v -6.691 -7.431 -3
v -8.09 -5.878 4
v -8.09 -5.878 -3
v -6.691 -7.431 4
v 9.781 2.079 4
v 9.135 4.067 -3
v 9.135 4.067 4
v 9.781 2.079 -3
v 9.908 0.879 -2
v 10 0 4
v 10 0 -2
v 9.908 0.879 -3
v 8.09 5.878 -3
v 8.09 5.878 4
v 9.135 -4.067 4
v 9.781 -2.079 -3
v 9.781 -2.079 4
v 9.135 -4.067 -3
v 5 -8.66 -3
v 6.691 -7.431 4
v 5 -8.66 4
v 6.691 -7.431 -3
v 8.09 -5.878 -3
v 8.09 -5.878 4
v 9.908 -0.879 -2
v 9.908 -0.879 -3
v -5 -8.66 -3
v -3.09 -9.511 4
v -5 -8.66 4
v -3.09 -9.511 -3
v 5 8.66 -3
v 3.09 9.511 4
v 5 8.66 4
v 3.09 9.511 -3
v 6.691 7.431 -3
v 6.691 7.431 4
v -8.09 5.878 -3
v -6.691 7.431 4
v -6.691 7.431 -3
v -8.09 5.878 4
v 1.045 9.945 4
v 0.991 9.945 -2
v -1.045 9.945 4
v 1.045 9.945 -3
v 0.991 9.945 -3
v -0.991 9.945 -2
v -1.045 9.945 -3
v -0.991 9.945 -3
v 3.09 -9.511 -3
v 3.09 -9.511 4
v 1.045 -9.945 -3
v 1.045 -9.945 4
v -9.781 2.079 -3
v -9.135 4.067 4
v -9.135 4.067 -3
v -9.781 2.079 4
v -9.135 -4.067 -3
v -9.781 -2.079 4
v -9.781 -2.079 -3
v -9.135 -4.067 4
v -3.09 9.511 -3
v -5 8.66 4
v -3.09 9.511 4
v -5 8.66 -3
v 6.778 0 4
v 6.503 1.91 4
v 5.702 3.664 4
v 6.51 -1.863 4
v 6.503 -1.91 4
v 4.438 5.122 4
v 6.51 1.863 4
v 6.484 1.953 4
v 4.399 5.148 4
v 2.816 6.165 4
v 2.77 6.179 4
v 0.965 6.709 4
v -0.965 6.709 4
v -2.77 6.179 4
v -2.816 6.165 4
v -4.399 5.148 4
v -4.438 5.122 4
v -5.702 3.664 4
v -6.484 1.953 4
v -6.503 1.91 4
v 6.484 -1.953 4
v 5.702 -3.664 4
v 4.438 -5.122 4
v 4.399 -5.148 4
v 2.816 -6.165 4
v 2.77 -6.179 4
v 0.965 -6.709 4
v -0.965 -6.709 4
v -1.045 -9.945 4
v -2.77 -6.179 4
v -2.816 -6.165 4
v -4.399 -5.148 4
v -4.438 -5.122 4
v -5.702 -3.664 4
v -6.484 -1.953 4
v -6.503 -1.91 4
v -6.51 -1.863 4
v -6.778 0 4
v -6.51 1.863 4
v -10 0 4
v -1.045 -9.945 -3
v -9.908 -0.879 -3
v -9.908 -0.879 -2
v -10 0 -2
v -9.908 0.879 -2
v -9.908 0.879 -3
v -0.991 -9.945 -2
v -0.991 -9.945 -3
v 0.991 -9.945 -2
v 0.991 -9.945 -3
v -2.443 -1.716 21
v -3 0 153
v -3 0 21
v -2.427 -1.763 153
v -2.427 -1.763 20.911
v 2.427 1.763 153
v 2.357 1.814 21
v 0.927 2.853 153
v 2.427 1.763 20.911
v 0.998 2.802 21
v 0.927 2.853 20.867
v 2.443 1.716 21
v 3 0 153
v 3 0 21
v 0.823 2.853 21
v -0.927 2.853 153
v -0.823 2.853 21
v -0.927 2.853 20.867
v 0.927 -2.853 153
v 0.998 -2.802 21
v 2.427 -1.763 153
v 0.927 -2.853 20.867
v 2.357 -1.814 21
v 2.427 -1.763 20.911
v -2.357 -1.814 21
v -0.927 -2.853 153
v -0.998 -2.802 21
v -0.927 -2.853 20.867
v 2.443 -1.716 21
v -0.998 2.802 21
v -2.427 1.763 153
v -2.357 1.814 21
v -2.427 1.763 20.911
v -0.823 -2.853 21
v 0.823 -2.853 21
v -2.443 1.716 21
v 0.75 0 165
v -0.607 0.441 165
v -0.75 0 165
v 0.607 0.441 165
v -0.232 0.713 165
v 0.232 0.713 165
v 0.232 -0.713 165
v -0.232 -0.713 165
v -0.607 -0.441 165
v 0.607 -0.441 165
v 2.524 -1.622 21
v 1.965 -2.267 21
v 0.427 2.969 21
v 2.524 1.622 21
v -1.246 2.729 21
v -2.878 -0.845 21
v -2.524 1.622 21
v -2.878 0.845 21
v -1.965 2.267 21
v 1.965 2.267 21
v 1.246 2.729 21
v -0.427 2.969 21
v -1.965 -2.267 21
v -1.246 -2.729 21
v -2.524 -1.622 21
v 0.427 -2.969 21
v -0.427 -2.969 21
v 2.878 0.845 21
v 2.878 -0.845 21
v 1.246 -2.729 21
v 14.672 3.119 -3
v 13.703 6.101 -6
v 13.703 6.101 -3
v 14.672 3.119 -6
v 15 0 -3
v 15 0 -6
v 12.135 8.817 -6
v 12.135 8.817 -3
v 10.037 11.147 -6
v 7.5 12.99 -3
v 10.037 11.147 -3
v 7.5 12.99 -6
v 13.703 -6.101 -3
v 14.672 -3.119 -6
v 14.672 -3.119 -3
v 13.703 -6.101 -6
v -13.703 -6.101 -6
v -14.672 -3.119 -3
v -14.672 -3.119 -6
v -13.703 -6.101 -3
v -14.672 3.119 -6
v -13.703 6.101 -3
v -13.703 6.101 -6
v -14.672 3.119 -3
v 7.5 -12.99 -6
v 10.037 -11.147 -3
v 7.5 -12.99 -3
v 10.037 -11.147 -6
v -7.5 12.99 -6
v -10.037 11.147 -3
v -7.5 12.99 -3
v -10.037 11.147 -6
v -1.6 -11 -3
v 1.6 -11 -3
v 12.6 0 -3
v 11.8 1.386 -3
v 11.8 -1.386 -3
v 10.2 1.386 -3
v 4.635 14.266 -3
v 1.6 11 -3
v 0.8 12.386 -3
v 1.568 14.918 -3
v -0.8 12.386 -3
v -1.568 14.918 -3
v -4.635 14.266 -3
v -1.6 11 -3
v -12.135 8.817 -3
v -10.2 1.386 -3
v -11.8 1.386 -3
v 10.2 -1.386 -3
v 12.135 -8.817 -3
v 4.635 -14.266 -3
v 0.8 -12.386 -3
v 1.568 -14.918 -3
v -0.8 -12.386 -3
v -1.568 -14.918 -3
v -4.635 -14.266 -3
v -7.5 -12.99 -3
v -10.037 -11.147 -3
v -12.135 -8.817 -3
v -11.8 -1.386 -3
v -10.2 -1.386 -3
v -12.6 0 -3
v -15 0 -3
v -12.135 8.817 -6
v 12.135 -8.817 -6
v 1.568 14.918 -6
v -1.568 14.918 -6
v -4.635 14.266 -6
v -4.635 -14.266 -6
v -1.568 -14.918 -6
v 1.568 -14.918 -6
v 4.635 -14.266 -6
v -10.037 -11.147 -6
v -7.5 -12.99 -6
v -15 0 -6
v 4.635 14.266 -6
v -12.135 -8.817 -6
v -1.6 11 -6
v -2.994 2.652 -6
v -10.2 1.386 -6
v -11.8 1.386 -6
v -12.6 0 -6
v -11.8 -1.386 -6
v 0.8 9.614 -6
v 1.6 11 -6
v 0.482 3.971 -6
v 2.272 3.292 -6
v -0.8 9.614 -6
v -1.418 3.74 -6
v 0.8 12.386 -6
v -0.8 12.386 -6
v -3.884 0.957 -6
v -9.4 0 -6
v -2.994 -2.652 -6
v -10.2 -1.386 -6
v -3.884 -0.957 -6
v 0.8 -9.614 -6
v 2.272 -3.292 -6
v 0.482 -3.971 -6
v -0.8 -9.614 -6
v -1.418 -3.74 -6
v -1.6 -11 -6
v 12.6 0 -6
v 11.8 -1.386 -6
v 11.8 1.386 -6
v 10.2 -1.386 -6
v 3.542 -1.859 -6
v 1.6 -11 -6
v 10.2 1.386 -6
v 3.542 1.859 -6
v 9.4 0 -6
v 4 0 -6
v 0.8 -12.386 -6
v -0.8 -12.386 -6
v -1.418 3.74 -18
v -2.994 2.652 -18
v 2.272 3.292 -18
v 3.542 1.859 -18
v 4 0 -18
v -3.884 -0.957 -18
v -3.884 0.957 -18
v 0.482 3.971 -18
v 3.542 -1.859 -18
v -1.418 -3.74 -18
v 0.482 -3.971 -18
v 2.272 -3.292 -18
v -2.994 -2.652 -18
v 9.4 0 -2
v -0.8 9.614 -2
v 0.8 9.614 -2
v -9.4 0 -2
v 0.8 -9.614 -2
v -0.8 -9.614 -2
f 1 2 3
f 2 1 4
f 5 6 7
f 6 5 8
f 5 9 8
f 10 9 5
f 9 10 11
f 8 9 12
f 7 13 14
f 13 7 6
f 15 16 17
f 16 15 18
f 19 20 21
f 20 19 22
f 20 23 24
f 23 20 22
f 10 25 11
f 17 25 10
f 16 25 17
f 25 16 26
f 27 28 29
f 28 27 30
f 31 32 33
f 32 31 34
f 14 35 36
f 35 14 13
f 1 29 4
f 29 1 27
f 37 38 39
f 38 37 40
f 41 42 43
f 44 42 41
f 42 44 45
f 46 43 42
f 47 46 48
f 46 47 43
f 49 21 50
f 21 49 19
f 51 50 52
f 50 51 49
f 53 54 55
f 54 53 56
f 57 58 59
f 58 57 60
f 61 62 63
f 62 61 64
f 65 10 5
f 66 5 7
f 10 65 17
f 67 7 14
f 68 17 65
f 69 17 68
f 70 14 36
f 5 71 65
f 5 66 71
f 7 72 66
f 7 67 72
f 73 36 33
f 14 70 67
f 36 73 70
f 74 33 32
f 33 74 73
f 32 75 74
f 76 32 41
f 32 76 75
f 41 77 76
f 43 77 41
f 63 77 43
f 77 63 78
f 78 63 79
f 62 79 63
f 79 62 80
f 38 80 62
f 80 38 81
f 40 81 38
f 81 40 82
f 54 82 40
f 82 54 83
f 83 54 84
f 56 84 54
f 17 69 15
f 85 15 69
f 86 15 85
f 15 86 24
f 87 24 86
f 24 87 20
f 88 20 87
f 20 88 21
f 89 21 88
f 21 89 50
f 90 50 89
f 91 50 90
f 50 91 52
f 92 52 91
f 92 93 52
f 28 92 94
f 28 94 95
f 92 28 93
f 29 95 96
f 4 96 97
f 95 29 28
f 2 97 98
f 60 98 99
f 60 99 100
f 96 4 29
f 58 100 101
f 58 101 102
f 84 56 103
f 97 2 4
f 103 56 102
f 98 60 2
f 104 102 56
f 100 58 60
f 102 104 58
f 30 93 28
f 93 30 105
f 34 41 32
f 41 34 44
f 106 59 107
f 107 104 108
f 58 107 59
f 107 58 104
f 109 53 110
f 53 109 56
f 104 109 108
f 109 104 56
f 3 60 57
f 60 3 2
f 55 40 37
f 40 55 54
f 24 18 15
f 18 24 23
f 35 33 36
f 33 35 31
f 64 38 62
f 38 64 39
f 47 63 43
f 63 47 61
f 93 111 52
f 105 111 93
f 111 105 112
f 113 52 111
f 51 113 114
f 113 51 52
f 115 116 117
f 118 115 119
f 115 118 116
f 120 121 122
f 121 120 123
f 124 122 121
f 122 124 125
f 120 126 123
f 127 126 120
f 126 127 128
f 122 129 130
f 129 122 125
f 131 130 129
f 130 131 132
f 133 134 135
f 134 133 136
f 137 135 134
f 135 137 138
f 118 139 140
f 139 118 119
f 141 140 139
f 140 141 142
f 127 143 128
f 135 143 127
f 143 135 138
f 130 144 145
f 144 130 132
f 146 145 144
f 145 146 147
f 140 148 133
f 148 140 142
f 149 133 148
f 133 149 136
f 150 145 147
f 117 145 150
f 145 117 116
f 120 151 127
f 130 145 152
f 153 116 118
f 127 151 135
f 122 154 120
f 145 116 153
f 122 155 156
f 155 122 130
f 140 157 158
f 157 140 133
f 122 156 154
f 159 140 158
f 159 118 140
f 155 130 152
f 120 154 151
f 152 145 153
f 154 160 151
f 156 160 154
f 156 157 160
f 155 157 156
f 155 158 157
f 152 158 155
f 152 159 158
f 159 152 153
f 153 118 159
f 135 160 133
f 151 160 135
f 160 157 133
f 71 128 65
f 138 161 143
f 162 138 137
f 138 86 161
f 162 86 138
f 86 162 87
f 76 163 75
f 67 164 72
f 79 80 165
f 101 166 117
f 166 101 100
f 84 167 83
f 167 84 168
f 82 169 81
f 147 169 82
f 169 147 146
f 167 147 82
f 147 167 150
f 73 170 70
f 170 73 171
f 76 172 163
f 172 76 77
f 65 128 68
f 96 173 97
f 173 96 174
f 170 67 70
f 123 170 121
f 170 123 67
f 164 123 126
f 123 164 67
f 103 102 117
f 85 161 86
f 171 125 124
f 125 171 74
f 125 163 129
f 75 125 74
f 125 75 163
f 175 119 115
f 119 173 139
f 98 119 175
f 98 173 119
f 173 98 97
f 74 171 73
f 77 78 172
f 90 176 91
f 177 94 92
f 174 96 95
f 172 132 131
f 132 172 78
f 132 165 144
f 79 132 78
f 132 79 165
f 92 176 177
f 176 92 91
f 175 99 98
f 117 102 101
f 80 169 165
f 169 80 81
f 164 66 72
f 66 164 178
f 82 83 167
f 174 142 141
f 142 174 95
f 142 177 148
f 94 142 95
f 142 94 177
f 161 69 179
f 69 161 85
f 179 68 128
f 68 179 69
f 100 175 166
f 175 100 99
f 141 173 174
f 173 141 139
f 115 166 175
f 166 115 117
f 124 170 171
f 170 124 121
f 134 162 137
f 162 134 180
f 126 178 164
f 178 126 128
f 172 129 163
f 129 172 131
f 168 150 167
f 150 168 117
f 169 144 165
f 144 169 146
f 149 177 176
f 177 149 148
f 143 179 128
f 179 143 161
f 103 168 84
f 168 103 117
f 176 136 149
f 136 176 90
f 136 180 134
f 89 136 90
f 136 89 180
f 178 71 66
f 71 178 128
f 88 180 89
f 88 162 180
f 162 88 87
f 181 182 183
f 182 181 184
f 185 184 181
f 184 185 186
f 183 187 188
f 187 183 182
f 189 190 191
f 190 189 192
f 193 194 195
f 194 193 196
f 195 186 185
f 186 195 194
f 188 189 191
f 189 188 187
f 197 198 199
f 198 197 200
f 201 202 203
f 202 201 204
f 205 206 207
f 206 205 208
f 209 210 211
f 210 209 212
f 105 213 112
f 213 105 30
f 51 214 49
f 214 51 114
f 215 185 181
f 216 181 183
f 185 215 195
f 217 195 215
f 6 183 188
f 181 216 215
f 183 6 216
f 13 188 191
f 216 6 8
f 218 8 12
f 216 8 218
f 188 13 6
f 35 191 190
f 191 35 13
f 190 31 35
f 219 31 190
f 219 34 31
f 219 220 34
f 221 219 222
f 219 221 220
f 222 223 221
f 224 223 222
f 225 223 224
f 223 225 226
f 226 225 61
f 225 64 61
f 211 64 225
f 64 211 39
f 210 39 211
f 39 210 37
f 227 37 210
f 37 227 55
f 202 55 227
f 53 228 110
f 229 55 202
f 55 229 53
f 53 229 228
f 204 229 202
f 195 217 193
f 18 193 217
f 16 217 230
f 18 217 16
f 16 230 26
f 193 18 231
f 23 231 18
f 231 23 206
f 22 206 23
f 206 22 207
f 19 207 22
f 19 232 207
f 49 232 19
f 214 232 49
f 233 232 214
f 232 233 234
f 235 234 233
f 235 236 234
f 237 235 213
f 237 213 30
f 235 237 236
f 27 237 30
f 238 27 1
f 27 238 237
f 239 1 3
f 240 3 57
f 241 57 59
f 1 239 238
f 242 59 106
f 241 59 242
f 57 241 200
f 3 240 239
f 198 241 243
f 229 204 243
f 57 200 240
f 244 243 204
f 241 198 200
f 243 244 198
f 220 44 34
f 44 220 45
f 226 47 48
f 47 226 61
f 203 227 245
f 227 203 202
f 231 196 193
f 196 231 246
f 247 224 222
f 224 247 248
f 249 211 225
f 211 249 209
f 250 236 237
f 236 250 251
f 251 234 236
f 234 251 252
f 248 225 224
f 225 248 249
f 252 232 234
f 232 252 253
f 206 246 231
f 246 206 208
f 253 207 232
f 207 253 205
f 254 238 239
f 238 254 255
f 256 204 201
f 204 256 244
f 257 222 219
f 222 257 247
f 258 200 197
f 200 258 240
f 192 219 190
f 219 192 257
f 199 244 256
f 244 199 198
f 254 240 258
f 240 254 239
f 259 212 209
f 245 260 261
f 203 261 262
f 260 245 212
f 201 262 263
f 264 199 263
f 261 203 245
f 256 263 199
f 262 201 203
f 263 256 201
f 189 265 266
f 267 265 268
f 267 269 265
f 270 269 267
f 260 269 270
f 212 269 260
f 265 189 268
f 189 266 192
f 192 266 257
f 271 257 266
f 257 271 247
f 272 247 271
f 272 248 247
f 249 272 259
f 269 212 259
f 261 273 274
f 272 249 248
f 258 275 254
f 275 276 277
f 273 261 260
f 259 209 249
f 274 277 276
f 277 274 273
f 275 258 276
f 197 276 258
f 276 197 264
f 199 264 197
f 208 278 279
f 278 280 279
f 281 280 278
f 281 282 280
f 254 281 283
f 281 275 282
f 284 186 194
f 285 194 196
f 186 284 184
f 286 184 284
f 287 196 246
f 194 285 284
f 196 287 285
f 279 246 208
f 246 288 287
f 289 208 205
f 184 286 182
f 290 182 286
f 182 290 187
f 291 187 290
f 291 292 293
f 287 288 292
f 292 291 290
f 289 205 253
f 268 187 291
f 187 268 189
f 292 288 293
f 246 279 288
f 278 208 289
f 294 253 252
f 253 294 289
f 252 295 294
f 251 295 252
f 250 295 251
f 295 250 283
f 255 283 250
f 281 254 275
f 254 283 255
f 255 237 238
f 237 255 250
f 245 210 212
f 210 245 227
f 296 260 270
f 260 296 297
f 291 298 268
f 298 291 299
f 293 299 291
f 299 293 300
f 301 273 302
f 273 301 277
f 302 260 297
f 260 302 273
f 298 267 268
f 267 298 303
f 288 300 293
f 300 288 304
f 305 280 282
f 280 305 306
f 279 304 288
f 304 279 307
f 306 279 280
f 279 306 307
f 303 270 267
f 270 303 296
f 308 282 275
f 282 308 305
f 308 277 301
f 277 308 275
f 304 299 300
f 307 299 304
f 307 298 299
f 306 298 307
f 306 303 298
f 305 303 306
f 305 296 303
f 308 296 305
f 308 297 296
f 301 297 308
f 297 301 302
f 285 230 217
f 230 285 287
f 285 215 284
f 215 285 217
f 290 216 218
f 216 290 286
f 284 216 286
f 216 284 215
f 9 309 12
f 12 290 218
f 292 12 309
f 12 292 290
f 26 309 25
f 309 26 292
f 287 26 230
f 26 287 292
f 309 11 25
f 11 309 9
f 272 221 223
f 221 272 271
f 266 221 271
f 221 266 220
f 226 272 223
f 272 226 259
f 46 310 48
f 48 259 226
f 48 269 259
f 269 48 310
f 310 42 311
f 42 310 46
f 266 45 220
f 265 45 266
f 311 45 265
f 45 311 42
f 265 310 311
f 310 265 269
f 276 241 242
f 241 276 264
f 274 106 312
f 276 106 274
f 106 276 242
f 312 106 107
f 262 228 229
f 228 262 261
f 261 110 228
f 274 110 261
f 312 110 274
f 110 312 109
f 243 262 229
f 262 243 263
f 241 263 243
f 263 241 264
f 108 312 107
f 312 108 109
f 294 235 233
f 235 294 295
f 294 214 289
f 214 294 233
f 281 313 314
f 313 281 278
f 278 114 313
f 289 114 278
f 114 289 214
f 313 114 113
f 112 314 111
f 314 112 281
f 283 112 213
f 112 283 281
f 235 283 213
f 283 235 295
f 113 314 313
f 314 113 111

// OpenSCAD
// Parameters
mast_h = 150; //[75:300:1]
mast_d = 6; //[3:12:0.1]
base_d = 20; //[10:40:0.5]
base_h = 8; //[4:16:0.5]
flange_d = 30; //[15:60:0.5]
flange_h = 3; //[1.5:8:0.5]
hole_count = 4; //[2:8:1]
hole_d = 3.2; //[2:6:0.1]
hole_circle_d = 22; //[12:44:0.5]
connector_d = 8; //[4:16:0.5]
connector_h = 12; //[6:30:1]
tip_h = 12; //[6:30:1]
tip_d2 = 1.5; //[0.5:4:0.1]
boot_h = 18; //[8:40:1]
boot_d = 14; //[8:28:0.5]
knurl_count = 24; //[8:64:1]
knurl_depth = 0.8; //[0.3:2:0.1]
knurl_w = 1.2; //[0.6:3:0.1]
knurl_h = 6; //[2:12:0.5]
overlap = 1; //[0.5:2:0.1]
hole_extra_h = 2; //[1:6:0.5]
enable_flange = 1; //[0:1:1]
enable_connector = 1; //[0:1:1]

// Base Cylinder
module base_cyl() {
  translate([0, 0, 0])
    cylinder(h=base_h, r=base_d/2, center=true);
}

// Mast Cylinder
module mast_cyl() {
  translate([0, 0, base_h/2 + mast_h/2 - overlap])
    cylinder(h=mast_h, r=mast_d/2, center=true);
}

// Tapered Tip Cone
module tapered_tip_cone() {
  translate([0, 0, base_h/2 + mast_h - overlap + tip_h/2])
    cylinder(h=tip_h, r1=mast_d/2, r2=tip_d2/2, center=true);
}

// Strain Relief Boot Cone
module strain_relief_boot_cone() {
  translate([0, 0, base_h/2 + boot_h/2 - overlap])
    cylinder(h=boot_h, r1=boot_d/2, r2=mast_d/2, center=true);
}

// Mounting Flange Cylinder
module mounting_flange_cyl() {
  translate([0, 0, -base_h/2 - (flange_h*enable_flange)/2 + overlap])
    cylinder(h=flange_h*enable_flange, r=flange_d/2, center=true);
}

// Connector Stub Cylinder
module connector_stub_cyl() {
  translate([0, 0, -base_h/2 - (flange_h*enable_flange) - (connector_h*enable_connector)/2 + overlap])
    cylinder(h=connector_h*enable_connector, r=connector_d/2, center=true);
}

// Mounting Holes
module mount_hole_0() {
  translate([hole_circle_d/2, 0, -base_h/2 - (flange_h*enable_flange)/2 + overlap])
    cylinder(h=flange_h*enable_flange + hole_extra_h, r=hole_d/2, center=true);
}

module mount_hole_90() {
  translate([0, hole_circle_d/2, -base_h/2 - (flange_h*enable_flange)/2 + overlap])
    cylinder(h=flange_h*enable_flange + hole_extra_h, r=hole_d/2, center=true);
}

module mount_hole_180() {
  translate([-hole_circle_d/2, 0, -base_h/2 - (flange_h*enable_flange)/2 + overlap])
    cylinder(h=flange_h*enable_flange + hole_extra_h, r=hole_d/2, center=true);
}

module mount_hole_270() {
  translate([0, -hole_circle_d/2, -base_h/2 - (flange_h*enable_flange)/2 + overlap])
    cylinder(h=flange_h*enable_flange + hole_extra_h, r=hole_d/2, center=true);
}

// Knurl Ribs
module knurl_rib(angle) {
  rotate([0, 0, angle])
    translate([base_d/2 + knurl_depth/2 - overlap, 0, -base_h/2 + knurl_h/2 + overlap])
      cube([knurl_depth, knurl_w, knurl_h], center=true);
}

// Assemble the antenna
module antenna() {
  difference() {
    union() {
      // Main solids
      union() {
        base_cyl();
        mast_cyl();
        tapered_tip_cone();
        strain_relief_boot_cone();
        mounting_flange_cyl();
        connector_stub_cyl();
      }
      // Knurling
      for (i = [0:knurl_count-1])
        knurl_rib(i * 360/knurl_count);
    }
    // Mounting holes
    mount_hole_0();
    mount_hole_90();
    mount_hole_180();
    mount_hole_270();
  }
}

// Render the antenna
antenna();
